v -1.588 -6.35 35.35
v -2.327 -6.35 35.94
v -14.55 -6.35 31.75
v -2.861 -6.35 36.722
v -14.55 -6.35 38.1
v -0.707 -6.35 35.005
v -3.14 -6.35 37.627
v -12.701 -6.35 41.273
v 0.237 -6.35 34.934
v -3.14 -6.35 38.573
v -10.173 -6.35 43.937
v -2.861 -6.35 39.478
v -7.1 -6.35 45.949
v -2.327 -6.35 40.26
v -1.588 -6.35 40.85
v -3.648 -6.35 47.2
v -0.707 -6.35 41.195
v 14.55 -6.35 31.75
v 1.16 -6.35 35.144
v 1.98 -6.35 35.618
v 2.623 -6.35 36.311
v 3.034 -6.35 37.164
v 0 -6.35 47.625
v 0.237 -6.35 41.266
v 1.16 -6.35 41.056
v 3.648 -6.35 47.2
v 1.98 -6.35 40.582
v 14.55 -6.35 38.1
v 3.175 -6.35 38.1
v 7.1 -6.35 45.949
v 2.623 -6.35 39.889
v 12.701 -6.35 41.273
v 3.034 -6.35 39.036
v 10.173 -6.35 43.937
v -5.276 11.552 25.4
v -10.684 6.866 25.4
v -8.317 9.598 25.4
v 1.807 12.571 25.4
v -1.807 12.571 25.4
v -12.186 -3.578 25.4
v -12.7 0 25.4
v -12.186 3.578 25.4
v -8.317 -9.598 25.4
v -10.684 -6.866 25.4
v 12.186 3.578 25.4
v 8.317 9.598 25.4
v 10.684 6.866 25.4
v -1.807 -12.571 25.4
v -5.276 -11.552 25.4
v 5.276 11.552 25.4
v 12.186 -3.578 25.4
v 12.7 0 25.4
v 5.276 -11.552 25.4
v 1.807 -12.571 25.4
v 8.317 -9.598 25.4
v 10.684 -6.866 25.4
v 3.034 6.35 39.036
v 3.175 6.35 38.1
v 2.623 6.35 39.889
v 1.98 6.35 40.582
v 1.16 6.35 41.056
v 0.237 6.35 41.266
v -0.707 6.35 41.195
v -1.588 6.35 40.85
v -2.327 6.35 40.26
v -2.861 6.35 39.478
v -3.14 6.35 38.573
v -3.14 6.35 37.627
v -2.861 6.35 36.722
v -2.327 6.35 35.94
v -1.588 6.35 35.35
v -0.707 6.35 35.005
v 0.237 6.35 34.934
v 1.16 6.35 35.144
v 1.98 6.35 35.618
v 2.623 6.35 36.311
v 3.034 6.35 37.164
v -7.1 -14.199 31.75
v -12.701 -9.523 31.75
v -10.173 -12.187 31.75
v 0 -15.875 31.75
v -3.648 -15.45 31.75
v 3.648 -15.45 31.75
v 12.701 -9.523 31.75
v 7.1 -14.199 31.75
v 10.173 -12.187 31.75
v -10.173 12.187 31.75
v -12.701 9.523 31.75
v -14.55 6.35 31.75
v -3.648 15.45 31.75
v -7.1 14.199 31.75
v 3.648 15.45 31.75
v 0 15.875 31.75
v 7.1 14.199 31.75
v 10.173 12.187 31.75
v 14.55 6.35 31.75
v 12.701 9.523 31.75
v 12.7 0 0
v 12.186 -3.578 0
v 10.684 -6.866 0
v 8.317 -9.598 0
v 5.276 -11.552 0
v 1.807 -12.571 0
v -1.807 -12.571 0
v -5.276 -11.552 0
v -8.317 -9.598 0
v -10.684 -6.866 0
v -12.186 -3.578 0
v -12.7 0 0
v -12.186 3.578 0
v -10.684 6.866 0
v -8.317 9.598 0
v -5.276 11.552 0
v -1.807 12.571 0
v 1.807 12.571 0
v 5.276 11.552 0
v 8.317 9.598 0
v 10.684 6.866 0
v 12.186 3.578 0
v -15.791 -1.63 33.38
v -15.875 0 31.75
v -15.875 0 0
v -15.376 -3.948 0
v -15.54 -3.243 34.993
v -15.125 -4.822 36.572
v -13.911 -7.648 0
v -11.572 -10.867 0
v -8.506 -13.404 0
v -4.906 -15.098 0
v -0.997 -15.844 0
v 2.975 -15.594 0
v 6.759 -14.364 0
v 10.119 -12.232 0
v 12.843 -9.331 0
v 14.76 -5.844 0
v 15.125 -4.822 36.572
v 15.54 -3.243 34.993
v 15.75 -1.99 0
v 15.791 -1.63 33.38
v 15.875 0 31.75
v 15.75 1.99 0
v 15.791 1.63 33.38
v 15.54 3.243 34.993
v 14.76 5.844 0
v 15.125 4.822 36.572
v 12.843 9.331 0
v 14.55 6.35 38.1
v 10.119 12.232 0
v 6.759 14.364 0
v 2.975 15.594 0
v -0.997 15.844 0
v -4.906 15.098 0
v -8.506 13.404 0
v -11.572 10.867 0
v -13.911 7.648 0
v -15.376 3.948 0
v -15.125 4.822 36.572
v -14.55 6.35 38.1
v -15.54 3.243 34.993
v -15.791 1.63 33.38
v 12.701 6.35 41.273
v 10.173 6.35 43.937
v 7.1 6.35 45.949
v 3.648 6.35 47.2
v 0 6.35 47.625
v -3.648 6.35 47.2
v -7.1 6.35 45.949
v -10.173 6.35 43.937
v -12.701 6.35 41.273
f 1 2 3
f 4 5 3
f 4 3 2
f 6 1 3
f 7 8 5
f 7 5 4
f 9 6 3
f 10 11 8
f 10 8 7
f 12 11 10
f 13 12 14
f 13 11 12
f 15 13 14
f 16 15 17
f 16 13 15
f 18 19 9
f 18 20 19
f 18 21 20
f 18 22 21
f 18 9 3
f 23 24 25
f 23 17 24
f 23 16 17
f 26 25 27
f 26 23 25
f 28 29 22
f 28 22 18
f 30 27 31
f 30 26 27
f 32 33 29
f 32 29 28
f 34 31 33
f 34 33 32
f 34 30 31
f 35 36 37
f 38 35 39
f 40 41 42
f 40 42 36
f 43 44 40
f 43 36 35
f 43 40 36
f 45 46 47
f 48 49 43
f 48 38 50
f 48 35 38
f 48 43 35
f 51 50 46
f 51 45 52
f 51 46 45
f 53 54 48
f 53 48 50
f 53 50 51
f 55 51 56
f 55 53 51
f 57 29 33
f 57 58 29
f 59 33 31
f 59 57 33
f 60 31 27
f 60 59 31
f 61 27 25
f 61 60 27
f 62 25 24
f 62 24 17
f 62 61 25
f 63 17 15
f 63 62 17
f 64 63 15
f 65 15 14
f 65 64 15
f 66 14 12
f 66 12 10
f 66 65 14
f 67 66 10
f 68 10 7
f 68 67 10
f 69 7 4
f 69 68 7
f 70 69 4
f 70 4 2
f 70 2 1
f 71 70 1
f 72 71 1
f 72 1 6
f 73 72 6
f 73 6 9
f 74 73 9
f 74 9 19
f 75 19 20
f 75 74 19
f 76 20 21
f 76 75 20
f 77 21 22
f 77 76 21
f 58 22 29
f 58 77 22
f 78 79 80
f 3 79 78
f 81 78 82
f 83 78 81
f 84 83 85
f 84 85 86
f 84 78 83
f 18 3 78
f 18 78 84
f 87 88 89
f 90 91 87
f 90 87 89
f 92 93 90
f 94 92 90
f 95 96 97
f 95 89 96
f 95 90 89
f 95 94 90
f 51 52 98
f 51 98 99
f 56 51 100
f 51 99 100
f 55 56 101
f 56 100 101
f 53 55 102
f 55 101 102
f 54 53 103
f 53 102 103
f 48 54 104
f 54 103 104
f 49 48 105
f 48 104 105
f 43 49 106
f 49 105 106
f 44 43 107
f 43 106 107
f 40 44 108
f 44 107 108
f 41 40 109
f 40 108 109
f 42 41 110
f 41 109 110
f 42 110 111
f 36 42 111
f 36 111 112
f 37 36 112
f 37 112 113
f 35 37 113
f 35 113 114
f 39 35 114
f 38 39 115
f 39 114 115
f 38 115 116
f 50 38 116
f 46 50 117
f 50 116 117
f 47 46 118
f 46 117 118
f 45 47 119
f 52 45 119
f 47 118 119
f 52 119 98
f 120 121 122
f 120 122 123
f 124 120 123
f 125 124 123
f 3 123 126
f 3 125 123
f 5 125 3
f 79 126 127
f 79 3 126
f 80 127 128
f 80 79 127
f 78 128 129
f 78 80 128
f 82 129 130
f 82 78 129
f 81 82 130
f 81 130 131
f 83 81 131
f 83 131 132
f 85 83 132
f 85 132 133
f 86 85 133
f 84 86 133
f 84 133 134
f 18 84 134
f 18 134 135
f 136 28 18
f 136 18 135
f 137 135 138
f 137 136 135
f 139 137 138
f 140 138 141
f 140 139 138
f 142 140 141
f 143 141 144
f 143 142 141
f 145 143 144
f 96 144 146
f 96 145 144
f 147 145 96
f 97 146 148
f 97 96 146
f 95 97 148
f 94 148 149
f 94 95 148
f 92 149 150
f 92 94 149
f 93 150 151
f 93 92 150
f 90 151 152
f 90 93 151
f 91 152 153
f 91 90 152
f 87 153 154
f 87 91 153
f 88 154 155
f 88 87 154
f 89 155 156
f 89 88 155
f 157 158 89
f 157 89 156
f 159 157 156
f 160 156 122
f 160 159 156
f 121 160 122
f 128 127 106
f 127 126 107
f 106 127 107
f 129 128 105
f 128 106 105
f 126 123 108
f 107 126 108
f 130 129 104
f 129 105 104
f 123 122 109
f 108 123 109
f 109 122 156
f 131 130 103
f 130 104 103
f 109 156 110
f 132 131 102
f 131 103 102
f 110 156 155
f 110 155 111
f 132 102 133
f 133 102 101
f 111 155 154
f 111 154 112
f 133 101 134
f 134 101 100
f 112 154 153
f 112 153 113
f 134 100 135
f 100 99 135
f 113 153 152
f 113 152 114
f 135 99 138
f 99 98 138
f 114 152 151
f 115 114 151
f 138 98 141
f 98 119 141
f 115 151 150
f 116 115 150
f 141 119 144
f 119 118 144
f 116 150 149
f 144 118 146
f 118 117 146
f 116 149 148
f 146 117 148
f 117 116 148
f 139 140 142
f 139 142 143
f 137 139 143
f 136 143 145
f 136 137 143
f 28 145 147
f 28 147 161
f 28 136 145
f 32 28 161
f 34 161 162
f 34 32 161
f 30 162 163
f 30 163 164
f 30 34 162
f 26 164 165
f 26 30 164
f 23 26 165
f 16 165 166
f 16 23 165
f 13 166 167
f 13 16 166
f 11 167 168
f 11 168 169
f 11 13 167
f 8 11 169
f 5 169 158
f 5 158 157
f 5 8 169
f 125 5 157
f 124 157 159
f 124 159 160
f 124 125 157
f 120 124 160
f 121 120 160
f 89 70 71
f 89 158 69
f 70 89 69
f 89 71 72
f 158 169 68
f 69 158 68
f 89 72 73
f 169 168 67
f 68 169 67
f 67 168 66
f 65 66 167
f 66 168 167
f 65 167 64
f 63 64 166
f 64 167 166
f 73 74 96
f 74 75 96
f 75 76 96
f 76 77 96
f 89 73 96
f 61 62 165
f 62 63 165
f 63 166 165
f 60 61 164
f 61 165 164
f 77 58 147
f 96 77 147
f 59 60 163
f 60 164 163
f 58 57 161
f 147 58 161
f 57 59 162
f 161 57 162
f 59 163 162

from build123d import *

# Parameters (mm, degrees)
F0_R          = 15.875
F1_DEPTH      = 31.75
F2_R          = 12.7
F3_DEPTH      = 25.4
F4_R          = 3.175
F5_DEPTH      = 6.35
F5_DEPTH_BACK = 6.35
F6_W          = 11.146276543
F6_H          = 50.8


# Not quite as in the source:
# - after a boolean that leaves OpenCascade's solid faulty, fix() repairs it


with BuildPart() as f1:
    # F0 (on Top) → F1 (new body)
    with BuildSketch(Plane.XY):
        Circle(F0_R)
    extrude(amount=F1_DEPTH)

    # F2 (on face) → F3 (cut)
    with BuildSketch(Plane(origin=(0, 0, 0), x_dir=(1, 0, 0), z_dir=(0, 0, -1))):
        Circle(F2_R)
    extrude(amount=-F3_DEPTH, mode=Mode.SUBTRACT)

    # F4 (on Front) → F5 (join, two sides)
    with BuildSketch(Plane.XZ) as f5_sk:
        with BuildLine():
            ThreePointArc((15.875, 31.75), (0, 47.625), (-15.875, 31.75))
            Line((-15.875, 31.75), (15.875, 31.75))
        make_face()
        with Locations((0, 38.1)):
            Circle(F4_R, mode=Mode.SUBTRACT)
    extrude(amount=F5_DEPTH)
    extrude(f5_sk.sketch, amount=-F5_DEPTH_BACK)

    # F6 (on Front) → F7 (revolve, cut)
    with BuildSketch(Plane.XZ):
        with Locations((-21.4481382715, 25.4)):
            Rectangle(F6_W, F6_H)
    revolve(axis=Axis((0, 0, 12.5730000436), (0, 0, 1)), mode=Mode.SUBTRACT)

    add(f1.part.fix(), mode=Mode.REPLACE)


solid = f1.part
